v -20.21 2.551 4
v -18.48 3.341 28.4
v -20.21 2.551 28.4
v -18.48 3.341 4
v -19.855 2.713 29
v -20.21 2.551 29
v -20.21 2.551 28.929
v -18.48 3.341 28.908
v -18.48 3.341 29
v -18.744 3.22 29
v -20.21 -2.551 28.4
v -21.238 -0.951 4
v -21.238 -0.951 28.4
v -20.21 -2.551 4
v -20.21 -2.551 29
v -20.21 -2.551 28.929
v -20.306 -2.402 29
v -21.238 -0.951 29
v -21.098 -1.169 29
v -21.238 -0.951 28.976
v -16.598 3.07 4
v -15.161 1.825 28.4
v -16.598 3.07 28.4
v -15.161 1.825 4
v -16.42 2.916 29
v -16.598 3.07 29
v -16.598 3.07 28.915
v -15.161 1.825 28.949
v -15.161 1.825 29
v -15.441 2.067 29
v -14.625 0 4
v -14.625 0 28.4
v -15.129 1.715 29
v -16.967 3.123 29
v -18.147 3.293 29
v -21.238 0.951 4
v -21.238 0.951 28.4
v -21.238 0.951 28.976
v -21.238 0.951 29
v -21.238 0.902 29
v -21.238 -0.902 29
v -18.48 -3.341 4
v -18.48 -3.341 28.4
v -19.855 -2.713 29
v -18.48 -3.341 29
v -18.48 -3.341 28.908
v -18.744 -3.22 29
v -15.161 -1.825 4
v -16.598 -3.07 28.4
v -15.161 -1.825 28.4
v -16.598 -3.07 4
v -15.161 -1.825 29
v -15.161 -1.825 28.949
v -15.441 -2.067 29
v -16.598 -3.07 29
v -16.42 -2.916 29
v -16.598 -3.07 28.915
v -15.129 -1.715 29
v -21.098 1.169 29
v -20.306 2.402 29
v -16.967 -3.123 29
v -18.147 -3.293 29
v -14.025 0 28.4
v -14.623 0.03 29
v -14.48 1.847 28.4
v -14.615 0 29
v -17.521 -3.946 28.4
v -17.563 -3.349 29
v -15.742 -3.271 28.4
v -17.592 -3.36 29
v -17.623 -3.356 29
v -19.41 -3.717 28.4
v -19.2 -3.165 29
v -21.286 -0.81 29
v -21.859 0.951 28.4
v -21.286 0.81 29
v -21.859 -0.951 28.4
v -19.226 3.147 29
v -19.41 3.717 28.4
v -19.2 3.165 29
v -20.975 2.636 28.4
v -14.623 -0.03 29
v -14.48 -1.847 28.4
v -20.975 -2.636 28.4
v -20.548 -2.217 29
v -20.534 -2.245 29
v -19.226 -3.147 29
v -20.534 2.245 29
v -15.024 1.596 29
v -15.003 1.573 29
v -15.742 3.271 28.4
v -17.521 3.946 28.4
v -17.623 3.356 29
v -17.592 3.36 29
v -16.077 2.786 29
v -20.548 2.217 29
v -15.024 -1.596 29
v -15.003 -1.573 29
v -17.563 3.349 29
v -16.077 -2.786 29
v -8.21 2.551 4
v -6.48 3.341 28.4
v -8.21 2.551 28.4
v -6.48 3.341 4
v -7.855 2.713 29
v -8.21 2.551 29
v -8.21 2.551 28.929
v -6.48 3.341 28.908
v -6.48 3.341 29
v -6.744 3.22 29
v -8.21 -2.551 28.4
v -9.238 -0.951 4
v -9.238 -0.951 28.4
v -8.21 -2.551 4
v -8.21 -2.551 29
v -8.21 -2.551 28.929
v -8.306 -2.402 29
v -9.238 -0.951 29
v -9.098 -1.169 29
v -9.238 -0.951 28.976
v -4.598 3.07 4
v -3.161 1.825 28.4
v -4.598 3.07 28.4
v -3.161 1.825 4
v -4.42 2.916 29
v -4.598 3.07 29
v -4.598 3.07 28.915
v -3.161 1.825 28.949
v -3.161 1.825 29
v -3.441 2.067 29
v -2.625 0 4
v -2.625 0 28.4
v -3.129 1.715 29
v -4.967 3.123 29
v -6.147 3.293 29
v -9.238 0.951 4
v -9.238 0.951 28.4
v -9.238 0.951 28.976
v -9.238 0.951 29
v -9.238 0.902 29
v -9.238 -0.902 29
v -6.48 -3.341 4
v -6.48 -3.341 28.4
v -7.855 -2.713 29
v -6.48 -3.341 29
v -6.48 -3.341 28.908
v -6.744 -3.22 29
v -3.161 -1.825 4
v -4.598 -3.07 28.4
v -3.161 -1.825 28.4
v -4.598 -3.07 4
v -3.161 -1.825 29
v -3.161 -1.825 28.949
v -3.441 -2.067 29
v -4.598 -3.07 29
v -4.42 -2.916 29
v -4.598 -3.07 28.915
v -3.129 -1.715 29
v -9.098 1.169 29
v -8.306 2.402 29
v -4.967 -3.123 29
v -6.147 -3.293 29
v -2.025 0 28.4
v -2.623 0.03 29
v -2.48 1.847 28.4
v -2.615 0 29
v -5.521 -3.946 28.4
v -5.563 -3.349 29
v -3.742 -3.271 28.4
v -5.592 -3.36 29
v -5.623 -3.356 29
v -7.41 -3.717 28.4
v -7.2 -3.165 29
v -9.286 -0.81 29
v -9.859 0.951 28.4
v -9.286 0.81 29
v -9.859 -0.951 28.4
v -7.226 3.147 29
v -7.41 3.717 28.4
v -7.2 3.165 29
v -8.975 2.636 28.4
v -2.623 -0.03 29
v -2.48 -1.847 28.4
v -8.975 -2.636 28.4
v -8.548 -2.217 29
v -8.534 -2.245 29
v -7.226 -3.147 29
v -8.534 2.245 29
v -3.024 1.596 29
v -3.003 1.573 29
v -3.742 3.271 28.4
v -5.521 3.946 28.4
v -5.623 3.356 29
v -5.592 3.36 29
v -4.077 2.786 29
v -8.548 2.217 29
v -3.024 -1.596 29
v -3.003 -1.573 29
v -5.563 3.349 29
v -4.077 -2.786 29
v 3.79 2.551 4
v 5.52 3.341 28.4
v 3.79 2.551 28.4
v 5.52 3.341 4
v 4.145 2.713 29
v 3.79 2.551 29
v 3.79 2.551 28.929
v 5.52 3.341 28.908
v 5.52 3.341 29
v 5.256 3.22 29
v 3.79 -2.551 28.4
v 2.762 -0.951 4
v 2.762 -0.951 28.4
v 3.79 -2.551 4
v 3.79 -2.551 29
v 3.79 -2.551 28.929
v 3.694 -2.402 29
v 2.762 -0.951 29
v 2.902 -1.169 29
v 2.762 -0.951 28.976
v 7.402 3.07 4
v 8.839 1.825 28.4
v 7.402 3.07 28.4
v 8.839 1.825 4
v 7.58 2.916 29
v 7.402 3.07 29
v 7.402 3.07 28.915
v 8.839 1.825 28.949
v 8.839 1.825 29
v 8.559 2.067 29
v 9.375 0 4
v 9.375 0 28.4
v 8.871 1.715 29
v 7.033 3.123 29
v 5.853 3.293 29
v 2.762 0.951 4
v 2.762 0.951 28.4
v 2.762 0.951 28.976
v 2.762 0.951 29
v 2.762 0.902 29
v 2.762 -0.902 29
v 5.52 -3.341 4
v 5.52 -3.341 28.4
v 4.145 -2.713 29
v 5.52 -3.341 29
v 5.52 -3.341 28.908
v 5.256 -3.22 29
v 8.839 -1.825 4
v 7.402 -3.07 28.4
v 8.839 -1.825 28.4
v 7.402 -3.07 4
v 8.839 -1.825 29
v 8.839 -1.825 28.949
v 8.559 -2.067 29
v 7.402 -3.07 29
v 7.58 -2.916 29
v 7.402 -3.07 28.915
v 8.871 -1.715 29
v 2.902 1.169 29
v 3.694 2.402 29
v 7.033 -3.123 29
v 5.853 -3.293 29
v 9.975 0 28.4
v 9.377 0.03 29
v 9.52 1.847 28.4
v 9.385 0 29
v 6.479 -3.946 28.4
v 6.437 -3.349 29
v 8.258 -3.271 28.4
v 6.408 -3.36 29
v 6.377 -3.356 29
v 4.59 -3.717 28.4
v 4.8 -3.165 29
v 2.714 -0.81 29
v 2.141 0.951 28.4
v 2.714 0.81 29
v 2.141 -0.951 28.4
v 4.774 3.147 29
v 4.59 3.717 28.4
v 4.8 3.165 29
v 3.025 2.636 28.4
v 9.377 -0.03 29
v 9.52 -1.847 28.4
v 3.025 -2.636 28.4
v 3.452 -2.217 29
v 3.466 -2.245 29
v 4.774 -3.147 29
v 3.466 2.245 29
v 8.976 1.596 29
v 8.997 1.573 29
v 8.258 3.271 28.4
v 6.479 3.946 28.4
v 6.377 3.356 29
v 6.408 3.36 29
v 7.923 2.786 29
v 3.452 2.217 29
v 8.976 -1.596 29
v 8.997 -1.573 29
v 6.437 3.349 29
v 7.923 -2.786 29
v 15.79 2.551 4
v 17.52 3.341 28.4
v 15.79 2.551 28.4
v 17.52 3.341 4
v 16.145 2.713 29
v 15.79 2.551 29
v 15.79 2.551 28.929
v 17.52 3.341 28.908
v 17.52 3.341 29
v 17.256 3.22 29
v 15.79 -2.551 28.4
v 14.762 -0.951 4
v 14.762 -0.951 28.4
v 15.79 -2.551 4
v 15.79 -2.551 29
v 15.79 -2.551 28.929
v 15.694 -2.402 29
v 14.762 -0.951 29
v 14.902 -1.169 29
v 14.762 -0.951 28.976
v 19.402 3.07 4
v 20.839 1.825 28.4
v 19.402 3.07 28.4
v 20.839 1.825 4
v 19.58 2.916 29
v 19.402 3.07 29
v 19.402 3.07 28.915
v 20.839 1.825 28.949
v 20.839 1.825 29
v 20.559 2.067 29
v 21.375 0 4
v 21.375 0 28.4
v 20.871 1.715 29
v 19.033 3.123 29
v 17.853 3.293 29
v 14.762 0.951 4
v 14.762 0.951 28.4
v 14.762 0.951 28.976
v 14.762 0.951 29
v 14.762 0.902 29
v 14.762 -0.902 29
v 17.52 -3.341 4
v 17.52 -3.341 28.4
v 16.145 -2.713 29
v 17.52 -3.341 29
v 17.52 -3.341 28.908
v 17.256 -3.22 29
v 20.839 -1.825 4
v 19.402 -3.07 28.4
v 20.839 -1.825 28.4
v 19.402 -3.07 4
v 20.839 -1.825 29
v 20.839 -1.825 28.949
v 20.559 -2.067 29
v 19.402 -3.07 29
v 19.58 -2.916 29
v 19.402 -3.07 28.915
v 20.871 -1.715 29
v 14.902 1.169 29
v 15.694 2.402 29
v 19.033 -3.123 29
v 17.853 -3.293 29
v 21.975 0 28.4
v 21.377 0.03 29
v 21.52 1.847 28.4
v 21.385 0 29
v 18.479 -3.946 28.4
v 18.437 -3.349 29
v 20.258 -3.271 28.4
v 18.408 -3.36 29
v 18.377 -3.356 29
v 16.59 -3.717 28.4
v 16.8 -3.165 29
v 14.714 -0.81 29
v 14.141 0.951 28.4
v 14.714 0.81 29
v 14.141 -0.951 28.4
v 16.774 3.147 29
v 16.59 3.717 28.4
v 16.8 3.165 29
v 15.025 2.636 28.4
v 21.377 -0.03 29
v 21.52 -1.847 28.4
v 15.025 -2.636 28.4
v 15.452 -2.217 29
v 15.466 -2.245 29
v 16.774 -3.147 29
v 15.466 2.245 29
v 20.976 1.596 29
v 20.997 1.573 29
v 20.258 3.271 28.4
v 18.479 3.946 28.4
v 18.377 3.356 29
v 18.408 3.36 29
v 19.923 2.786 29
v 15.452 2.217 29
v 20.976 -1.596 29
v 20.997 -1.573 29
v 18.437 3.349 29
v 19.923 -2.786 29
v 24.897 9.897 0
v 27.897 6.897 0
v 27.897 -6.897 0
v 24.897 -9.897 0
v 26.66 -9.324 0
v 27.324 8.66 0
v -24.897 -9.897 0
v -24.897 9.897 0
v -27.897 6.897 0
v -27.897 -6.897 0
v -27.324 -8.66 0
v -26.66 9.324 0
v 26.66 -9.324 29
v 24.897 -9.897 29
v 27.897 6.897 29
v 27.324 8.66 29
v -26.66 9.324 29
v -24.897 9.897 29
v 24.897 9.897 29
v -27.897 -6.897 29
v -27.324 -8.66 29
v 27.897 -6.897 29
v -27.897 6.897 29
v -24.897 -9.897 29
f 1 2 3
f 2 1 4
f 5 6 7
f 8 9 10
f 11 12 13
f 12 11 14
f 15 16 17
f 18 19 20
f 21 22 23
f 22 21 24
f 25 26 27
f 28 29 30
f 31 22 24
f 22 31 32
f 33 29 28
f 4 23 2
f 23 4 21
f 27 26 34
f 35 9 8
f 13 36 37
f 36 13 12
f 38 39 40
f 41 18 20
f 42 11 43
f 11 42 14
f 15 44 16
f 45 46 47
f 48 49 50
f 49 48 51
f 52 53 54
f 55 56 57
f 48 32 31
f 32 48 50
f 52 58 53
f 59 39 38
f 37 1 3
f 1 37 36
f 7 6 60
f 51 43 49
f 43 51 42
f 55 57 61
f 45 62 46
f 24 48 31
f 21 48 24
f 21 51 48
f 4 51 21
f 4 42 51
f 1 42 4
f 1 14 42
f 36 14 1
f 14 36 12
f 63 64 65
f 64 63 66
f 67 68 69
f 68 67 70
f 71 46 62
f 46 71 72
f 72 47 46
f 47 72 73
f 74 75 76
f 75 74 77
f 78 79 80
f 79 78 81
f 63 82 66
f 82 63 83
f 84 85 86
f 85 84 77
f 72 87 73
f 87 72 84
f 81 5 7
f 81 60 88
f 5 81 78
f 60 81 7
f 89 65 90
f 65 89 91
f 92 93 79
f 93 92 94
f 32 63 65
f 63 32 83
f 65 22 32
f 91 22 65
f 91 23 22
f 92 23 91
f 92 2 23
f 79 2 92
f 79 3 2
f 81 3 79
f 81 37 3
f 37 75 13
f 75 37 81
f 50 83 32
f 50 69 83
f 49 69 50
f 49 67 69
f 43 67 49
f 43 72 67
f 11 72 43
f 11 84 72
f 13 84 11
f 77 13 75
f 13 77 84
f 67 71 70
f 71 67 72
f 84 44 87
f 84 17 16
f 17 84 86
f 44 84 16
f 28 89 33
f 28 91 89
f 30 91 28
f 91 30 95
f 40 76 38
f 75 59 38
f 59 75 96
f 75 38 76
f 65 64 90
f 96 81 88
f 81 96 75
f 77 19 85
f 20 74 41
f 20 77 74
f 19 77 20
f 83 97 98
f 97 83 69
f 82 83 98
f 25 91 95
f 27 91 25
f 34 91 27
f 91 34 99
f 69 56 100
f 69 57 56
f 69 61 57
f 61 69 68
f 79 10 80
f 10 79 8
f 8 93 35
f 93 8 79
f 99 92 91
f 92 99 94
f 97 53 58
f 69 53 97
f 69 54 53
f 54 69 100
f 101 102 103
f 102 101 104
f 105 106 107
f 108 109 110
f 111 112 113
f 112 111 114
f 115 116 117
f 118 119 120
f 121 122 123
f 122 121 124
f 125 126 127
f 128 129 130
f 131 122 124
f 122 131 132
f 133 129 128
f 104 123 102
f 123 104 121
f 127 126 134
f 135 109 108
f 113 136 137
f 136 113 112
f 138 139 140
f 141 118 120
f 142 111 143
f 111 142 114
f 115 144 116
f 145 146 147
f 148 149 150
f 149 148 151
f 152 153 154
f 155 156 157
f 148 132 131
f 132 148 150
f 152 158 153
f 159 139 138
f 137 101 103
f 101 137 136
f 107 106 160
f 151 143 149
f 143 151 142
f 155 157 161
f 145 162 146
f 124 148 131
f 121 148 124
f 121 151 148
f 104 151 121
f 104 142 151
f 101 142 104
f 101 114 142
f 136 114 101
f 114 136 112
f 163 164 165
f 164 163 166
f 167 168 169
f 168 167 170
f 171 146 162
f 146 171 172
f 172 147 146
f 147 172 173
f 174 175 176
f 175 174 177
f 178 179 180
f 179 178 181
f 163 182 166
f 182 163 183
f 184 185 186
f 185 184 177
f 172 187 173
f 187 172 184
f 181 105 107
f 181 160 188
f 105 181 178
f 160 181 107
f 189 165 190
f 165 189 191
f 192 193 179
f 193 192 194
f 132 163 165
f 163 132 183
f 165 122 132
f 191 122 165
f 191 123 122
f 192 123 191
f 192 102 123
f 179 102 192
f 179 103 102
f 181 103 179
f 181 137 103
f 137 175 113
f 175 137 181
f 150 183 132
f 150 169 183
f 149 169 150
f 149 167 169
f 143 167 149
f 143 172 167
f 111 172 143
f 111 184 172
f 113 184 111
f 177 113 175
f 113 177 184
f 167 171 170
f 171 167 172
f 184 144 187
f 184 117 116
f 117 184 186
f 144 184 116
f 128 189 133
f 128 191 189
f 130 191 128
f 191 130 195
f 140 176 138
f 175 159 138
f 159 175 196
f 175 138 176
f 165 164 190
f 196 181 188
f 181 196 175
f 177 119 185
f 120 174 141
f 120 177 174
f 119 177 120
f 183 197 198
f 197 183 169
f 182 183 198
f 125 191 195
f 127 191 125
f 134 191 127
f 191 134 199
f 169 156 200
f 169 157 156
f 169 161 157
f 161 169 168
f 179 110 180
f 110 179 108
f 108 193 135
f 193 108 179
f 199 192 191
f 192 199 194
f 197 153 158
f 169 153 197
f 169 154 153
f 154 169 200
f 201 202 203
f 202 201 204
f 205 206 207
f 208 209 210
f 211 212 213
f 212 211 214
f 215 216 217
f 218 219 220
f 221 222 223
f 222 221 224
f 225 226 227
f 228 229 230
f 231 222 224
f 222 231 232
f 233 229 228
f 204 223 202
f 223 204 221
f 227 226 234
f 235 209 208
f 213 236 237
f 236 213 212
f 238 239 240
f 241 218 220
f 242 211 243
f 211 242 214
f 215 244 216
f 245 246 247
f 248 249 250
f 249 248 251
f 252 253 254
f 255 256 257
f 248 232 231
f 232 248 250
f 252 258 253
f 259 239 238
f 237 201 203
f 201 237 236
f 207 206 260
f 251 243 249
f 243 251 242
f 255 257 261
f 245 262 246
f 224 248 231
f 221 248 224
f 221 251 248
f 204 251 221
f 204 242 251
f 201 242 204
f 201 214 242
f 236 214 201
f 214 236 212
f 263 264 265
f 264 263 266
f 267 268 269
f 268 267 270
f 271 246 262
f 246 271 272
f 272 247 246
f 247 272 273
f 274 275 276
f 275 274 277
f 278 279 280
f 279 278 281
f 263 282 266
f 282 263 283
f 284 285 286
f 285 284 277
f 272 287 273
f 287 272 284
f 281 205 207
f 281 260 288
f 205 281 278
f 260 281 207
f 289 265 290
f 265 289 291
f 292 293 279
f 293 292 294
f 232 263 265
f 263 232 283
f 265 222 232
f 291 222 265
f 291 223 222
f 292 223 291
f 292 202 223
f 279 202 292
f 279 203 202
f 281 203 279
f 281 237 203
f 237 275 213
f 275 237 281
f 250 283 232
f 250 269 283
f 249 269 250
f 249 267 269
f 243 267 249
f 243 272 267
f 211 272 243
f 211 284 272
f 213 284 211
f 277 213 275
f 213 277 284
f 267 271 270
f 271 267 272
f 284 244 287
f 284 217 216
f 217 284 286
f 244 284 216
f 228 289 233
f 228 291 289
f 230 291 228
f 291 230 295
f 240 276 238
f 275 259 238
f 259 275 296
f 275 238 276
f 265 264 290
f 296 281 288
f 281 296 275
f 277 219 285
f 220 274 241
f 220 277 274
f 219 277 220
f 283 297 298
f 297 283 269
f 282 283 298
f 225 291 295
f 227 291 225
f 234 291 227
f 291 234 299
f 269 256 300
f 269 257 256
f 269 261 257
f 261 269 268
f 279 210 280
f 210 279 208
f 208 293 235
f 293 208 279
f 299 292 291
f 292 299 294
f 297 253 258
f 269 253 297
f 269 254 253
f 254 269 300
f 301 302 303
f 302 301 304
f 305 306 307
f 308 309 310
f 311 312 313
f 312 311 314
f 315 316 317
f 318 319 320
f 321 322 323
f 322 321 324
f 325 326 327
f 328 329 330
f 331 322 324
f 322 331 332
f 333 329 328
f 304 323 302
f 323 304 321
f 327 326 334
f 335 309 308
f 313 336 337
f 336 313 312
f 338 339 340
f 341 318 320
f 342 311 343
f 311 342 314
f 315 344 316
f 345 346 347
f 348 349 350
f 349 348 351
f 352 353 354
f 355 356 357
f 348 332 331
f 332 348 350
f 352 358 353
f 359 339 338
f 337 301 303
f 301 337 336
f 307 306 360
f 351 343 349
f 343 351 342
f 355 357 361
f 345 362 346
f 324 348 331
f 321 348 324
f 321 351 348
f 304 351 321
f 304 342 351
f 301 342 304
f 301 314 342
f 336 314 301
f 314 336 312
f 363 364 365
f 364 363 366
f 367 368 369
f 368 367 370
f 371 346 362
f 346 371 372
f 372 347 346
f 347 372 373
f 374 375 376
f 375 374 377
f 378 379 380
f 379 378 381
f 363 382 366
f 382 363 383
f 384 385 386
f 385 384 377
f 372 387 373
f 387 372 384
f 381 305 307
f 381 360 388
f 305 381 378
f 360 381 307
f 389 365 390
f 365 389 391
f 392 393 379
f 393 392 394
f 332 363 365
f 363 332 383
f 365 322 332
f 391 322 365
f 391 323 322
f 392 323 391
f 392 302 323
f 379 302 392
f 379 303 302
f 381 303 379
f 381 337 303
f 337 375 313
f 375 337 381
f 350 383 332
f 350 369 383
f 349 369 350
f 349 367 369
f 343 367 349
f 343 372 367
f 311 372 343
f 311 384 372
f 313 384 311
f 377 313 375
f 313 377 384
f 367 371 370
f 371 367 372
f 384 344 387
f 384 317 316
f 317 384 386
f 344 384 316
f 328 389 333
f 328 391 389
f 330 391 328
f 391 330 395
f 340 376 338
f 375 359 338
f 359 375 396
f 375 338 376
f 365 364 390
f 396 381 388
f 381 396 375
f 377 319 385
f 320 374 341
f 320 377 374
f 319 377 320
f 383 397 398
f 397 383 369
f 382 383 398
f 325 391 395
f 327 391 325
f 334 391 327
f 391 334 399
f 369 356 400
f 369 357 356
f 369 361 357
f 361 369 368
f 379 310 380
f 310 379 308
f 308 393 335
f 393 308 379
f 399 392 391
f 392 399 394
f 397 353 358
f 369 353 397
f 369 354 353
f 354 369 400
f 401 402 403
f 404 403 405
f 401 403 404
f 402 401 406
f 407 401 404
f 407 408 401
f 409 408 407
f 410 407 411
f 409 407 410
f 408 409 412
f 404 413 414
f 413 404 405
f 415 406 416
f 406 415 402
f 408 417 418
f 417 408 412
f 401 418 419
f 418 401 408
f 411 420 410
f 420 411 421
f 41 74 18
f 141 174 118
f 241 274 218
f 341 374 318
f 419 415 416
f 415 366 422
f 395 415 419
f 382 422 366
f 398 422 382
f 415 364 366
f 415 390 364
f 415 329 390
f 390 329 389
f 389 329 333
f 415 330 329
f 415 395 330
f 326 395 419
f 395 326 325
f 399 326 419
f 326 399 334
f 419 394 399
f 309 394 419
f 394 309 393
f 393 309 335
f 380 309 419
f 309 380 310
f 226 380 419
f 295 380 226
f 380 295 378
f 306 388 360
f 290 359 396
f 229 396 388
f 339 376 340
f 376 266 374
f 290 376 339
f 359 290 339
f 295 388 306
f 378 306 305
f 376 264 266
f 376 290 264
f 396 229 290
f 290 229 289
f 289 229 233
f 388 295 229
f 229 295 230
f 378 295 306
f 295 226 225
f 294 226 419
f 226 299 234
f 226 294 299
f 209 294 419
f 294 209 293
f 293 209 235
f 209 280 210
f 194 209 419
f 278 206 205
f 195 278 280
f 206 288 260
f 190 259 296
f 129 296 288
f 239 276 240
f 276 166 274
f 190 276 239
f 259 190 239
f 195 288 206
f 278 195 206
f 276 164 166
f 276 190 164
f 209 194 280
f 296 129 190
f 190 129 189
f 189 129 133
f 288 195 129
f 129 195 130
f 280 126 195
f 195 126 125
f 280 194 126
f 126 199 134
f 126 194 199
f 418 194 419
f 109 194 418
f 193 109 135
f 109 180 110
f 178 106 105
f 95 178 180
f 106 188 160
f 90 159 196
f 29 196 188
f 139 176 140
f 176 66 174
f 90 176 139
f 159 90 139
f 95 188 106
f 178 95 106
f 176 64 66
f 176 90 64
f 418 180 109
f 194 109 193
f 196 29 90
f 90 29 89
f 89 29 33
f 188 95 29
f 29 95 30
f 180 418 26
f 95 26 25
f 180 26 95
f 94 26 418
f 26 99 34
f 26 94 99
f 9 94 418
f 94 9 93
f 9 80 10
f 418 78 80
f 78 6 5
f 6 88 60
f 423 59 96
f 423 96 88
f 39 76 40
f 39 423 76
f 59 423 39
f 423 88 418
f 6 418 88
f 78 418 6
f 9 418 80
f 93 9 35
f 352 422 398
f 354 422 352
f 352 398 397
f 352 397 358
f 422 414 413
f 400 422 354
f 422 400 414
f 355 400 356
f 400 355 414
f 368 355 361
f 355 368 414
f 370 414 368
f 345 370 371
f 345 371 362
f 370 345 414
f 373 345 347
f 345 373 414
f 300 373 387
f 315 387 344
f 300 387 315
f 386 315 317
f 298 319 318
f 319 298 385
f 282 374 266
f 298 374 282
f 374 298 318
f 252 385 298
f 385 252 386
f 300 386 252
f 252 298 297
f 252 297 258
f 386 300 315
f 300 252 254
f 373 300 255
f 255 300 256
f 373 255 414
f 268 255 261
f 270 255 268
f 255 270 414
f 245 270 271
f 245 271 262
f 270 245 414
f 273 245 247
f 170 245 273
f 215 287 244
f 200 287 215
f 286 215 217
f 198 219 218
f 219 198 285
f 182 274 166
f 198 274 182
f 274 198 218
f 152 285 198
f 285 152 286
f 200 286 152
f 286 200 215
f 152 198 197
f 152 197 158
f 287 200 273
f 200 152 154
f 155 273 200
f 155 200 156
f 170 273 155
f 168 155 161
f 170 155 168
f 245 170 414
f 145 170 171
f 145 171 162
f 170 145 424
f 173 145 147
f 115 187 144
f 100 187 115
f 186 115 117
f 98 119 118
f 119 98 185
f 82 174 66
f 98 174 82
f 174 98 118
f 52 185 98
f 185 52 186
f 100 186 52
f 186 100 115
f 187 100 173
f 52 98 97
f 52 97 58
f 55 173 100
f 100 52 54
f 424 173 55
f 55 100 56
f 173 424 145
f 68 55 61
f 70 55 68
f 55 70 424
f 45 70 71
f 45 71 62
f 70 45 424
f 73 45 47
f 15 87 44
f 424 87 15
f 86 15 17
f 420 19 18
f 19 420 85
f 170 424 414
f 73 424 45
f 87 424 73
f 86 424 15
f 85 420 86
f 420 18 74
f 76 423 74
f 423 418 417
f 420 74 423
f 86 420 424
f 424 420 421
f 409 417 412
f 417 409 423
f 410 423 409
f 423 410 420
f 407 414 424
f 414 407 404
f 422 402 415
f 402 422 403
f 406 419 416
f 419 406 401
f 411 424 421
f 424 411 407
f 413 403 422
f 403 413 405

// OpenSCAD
// orcad: block that stands a row of drill bits or hex driver bits upright in bored holes.
hole_style = 0; // [0:Round, 1:Hex flat]
bit_diameter = 6.35;
column_count = 4;
row_count = 1;
hole_spacing = 12;
hole_depth = 25;
base_thickness = 4;
edge_margin = 6;
hole_tolerance = 0.2;
chamfer = 0.6;
corner_radius = 3;

col_n = max(column_count, 1);
row_n = max(row_count, 1);
hole_d = bit_diameter + 2 * hole_tolerance;       // across the flats of a hex hole
corners = hole_d * 2 / sqrt(3);                   // across the corners of a hex hole
chamfer_h = min(chamfer, max(hole_depth - 1, 0));
block_x = max((col_n - 1) * hole_spacing + corners + 2 * edge_margin, corners + 4);
block_y = max((row_n - 1) * hole_spacing + corners + 2 * edge_margin, corners + 4);
block_height = hole_depth + base_thickness;
r = min(corner_radius, block_x / 2 - 0.01, block_y / 2 - 0.01);

module bit_hole() {
    if (hole_style == 1) {
        cylinder(d = corners, h = hole_depth + 0.01, $fn = 6);
        if (chamfer_h > 0)
            translate([0, 0, hole_depth - chamfer_h])
                cylinder(d1 = corners + 2 * chamfer_h, d2 = corners, h = chamfer_h + 0.01, $fn = 6);
    } else {
        cylinder(d = hole_d, h = hole_depth + 0.01);
        if (chamfer_h > 0)
            translate([0, 0, hole_depth - chamfer_h])
                cylinder(d1 = hole_d + 2 * chamfer_h, d2 = hole_d, h = chamfer_h + 0.01);
    }
}

difference() {
    translate([-block_x / 2 + r, -block_y / 2 + r, 0])
        if (r > 0)
            linear_extrude(height = block_height)
                offset(r = r) square([block_x - 2 * r, block_y - 2 * r]);
        else
            cube([block_x, block_y, block_height]);

    for (i = [0 : col_n - 1], j = [0 : row_n - 1])
        translate([(i - (col_n - 1) / 2) * hole_spacing, (j - (row_n - 1) / 2) * hole_spacing, base_thickness])
            bit_hole();
}
